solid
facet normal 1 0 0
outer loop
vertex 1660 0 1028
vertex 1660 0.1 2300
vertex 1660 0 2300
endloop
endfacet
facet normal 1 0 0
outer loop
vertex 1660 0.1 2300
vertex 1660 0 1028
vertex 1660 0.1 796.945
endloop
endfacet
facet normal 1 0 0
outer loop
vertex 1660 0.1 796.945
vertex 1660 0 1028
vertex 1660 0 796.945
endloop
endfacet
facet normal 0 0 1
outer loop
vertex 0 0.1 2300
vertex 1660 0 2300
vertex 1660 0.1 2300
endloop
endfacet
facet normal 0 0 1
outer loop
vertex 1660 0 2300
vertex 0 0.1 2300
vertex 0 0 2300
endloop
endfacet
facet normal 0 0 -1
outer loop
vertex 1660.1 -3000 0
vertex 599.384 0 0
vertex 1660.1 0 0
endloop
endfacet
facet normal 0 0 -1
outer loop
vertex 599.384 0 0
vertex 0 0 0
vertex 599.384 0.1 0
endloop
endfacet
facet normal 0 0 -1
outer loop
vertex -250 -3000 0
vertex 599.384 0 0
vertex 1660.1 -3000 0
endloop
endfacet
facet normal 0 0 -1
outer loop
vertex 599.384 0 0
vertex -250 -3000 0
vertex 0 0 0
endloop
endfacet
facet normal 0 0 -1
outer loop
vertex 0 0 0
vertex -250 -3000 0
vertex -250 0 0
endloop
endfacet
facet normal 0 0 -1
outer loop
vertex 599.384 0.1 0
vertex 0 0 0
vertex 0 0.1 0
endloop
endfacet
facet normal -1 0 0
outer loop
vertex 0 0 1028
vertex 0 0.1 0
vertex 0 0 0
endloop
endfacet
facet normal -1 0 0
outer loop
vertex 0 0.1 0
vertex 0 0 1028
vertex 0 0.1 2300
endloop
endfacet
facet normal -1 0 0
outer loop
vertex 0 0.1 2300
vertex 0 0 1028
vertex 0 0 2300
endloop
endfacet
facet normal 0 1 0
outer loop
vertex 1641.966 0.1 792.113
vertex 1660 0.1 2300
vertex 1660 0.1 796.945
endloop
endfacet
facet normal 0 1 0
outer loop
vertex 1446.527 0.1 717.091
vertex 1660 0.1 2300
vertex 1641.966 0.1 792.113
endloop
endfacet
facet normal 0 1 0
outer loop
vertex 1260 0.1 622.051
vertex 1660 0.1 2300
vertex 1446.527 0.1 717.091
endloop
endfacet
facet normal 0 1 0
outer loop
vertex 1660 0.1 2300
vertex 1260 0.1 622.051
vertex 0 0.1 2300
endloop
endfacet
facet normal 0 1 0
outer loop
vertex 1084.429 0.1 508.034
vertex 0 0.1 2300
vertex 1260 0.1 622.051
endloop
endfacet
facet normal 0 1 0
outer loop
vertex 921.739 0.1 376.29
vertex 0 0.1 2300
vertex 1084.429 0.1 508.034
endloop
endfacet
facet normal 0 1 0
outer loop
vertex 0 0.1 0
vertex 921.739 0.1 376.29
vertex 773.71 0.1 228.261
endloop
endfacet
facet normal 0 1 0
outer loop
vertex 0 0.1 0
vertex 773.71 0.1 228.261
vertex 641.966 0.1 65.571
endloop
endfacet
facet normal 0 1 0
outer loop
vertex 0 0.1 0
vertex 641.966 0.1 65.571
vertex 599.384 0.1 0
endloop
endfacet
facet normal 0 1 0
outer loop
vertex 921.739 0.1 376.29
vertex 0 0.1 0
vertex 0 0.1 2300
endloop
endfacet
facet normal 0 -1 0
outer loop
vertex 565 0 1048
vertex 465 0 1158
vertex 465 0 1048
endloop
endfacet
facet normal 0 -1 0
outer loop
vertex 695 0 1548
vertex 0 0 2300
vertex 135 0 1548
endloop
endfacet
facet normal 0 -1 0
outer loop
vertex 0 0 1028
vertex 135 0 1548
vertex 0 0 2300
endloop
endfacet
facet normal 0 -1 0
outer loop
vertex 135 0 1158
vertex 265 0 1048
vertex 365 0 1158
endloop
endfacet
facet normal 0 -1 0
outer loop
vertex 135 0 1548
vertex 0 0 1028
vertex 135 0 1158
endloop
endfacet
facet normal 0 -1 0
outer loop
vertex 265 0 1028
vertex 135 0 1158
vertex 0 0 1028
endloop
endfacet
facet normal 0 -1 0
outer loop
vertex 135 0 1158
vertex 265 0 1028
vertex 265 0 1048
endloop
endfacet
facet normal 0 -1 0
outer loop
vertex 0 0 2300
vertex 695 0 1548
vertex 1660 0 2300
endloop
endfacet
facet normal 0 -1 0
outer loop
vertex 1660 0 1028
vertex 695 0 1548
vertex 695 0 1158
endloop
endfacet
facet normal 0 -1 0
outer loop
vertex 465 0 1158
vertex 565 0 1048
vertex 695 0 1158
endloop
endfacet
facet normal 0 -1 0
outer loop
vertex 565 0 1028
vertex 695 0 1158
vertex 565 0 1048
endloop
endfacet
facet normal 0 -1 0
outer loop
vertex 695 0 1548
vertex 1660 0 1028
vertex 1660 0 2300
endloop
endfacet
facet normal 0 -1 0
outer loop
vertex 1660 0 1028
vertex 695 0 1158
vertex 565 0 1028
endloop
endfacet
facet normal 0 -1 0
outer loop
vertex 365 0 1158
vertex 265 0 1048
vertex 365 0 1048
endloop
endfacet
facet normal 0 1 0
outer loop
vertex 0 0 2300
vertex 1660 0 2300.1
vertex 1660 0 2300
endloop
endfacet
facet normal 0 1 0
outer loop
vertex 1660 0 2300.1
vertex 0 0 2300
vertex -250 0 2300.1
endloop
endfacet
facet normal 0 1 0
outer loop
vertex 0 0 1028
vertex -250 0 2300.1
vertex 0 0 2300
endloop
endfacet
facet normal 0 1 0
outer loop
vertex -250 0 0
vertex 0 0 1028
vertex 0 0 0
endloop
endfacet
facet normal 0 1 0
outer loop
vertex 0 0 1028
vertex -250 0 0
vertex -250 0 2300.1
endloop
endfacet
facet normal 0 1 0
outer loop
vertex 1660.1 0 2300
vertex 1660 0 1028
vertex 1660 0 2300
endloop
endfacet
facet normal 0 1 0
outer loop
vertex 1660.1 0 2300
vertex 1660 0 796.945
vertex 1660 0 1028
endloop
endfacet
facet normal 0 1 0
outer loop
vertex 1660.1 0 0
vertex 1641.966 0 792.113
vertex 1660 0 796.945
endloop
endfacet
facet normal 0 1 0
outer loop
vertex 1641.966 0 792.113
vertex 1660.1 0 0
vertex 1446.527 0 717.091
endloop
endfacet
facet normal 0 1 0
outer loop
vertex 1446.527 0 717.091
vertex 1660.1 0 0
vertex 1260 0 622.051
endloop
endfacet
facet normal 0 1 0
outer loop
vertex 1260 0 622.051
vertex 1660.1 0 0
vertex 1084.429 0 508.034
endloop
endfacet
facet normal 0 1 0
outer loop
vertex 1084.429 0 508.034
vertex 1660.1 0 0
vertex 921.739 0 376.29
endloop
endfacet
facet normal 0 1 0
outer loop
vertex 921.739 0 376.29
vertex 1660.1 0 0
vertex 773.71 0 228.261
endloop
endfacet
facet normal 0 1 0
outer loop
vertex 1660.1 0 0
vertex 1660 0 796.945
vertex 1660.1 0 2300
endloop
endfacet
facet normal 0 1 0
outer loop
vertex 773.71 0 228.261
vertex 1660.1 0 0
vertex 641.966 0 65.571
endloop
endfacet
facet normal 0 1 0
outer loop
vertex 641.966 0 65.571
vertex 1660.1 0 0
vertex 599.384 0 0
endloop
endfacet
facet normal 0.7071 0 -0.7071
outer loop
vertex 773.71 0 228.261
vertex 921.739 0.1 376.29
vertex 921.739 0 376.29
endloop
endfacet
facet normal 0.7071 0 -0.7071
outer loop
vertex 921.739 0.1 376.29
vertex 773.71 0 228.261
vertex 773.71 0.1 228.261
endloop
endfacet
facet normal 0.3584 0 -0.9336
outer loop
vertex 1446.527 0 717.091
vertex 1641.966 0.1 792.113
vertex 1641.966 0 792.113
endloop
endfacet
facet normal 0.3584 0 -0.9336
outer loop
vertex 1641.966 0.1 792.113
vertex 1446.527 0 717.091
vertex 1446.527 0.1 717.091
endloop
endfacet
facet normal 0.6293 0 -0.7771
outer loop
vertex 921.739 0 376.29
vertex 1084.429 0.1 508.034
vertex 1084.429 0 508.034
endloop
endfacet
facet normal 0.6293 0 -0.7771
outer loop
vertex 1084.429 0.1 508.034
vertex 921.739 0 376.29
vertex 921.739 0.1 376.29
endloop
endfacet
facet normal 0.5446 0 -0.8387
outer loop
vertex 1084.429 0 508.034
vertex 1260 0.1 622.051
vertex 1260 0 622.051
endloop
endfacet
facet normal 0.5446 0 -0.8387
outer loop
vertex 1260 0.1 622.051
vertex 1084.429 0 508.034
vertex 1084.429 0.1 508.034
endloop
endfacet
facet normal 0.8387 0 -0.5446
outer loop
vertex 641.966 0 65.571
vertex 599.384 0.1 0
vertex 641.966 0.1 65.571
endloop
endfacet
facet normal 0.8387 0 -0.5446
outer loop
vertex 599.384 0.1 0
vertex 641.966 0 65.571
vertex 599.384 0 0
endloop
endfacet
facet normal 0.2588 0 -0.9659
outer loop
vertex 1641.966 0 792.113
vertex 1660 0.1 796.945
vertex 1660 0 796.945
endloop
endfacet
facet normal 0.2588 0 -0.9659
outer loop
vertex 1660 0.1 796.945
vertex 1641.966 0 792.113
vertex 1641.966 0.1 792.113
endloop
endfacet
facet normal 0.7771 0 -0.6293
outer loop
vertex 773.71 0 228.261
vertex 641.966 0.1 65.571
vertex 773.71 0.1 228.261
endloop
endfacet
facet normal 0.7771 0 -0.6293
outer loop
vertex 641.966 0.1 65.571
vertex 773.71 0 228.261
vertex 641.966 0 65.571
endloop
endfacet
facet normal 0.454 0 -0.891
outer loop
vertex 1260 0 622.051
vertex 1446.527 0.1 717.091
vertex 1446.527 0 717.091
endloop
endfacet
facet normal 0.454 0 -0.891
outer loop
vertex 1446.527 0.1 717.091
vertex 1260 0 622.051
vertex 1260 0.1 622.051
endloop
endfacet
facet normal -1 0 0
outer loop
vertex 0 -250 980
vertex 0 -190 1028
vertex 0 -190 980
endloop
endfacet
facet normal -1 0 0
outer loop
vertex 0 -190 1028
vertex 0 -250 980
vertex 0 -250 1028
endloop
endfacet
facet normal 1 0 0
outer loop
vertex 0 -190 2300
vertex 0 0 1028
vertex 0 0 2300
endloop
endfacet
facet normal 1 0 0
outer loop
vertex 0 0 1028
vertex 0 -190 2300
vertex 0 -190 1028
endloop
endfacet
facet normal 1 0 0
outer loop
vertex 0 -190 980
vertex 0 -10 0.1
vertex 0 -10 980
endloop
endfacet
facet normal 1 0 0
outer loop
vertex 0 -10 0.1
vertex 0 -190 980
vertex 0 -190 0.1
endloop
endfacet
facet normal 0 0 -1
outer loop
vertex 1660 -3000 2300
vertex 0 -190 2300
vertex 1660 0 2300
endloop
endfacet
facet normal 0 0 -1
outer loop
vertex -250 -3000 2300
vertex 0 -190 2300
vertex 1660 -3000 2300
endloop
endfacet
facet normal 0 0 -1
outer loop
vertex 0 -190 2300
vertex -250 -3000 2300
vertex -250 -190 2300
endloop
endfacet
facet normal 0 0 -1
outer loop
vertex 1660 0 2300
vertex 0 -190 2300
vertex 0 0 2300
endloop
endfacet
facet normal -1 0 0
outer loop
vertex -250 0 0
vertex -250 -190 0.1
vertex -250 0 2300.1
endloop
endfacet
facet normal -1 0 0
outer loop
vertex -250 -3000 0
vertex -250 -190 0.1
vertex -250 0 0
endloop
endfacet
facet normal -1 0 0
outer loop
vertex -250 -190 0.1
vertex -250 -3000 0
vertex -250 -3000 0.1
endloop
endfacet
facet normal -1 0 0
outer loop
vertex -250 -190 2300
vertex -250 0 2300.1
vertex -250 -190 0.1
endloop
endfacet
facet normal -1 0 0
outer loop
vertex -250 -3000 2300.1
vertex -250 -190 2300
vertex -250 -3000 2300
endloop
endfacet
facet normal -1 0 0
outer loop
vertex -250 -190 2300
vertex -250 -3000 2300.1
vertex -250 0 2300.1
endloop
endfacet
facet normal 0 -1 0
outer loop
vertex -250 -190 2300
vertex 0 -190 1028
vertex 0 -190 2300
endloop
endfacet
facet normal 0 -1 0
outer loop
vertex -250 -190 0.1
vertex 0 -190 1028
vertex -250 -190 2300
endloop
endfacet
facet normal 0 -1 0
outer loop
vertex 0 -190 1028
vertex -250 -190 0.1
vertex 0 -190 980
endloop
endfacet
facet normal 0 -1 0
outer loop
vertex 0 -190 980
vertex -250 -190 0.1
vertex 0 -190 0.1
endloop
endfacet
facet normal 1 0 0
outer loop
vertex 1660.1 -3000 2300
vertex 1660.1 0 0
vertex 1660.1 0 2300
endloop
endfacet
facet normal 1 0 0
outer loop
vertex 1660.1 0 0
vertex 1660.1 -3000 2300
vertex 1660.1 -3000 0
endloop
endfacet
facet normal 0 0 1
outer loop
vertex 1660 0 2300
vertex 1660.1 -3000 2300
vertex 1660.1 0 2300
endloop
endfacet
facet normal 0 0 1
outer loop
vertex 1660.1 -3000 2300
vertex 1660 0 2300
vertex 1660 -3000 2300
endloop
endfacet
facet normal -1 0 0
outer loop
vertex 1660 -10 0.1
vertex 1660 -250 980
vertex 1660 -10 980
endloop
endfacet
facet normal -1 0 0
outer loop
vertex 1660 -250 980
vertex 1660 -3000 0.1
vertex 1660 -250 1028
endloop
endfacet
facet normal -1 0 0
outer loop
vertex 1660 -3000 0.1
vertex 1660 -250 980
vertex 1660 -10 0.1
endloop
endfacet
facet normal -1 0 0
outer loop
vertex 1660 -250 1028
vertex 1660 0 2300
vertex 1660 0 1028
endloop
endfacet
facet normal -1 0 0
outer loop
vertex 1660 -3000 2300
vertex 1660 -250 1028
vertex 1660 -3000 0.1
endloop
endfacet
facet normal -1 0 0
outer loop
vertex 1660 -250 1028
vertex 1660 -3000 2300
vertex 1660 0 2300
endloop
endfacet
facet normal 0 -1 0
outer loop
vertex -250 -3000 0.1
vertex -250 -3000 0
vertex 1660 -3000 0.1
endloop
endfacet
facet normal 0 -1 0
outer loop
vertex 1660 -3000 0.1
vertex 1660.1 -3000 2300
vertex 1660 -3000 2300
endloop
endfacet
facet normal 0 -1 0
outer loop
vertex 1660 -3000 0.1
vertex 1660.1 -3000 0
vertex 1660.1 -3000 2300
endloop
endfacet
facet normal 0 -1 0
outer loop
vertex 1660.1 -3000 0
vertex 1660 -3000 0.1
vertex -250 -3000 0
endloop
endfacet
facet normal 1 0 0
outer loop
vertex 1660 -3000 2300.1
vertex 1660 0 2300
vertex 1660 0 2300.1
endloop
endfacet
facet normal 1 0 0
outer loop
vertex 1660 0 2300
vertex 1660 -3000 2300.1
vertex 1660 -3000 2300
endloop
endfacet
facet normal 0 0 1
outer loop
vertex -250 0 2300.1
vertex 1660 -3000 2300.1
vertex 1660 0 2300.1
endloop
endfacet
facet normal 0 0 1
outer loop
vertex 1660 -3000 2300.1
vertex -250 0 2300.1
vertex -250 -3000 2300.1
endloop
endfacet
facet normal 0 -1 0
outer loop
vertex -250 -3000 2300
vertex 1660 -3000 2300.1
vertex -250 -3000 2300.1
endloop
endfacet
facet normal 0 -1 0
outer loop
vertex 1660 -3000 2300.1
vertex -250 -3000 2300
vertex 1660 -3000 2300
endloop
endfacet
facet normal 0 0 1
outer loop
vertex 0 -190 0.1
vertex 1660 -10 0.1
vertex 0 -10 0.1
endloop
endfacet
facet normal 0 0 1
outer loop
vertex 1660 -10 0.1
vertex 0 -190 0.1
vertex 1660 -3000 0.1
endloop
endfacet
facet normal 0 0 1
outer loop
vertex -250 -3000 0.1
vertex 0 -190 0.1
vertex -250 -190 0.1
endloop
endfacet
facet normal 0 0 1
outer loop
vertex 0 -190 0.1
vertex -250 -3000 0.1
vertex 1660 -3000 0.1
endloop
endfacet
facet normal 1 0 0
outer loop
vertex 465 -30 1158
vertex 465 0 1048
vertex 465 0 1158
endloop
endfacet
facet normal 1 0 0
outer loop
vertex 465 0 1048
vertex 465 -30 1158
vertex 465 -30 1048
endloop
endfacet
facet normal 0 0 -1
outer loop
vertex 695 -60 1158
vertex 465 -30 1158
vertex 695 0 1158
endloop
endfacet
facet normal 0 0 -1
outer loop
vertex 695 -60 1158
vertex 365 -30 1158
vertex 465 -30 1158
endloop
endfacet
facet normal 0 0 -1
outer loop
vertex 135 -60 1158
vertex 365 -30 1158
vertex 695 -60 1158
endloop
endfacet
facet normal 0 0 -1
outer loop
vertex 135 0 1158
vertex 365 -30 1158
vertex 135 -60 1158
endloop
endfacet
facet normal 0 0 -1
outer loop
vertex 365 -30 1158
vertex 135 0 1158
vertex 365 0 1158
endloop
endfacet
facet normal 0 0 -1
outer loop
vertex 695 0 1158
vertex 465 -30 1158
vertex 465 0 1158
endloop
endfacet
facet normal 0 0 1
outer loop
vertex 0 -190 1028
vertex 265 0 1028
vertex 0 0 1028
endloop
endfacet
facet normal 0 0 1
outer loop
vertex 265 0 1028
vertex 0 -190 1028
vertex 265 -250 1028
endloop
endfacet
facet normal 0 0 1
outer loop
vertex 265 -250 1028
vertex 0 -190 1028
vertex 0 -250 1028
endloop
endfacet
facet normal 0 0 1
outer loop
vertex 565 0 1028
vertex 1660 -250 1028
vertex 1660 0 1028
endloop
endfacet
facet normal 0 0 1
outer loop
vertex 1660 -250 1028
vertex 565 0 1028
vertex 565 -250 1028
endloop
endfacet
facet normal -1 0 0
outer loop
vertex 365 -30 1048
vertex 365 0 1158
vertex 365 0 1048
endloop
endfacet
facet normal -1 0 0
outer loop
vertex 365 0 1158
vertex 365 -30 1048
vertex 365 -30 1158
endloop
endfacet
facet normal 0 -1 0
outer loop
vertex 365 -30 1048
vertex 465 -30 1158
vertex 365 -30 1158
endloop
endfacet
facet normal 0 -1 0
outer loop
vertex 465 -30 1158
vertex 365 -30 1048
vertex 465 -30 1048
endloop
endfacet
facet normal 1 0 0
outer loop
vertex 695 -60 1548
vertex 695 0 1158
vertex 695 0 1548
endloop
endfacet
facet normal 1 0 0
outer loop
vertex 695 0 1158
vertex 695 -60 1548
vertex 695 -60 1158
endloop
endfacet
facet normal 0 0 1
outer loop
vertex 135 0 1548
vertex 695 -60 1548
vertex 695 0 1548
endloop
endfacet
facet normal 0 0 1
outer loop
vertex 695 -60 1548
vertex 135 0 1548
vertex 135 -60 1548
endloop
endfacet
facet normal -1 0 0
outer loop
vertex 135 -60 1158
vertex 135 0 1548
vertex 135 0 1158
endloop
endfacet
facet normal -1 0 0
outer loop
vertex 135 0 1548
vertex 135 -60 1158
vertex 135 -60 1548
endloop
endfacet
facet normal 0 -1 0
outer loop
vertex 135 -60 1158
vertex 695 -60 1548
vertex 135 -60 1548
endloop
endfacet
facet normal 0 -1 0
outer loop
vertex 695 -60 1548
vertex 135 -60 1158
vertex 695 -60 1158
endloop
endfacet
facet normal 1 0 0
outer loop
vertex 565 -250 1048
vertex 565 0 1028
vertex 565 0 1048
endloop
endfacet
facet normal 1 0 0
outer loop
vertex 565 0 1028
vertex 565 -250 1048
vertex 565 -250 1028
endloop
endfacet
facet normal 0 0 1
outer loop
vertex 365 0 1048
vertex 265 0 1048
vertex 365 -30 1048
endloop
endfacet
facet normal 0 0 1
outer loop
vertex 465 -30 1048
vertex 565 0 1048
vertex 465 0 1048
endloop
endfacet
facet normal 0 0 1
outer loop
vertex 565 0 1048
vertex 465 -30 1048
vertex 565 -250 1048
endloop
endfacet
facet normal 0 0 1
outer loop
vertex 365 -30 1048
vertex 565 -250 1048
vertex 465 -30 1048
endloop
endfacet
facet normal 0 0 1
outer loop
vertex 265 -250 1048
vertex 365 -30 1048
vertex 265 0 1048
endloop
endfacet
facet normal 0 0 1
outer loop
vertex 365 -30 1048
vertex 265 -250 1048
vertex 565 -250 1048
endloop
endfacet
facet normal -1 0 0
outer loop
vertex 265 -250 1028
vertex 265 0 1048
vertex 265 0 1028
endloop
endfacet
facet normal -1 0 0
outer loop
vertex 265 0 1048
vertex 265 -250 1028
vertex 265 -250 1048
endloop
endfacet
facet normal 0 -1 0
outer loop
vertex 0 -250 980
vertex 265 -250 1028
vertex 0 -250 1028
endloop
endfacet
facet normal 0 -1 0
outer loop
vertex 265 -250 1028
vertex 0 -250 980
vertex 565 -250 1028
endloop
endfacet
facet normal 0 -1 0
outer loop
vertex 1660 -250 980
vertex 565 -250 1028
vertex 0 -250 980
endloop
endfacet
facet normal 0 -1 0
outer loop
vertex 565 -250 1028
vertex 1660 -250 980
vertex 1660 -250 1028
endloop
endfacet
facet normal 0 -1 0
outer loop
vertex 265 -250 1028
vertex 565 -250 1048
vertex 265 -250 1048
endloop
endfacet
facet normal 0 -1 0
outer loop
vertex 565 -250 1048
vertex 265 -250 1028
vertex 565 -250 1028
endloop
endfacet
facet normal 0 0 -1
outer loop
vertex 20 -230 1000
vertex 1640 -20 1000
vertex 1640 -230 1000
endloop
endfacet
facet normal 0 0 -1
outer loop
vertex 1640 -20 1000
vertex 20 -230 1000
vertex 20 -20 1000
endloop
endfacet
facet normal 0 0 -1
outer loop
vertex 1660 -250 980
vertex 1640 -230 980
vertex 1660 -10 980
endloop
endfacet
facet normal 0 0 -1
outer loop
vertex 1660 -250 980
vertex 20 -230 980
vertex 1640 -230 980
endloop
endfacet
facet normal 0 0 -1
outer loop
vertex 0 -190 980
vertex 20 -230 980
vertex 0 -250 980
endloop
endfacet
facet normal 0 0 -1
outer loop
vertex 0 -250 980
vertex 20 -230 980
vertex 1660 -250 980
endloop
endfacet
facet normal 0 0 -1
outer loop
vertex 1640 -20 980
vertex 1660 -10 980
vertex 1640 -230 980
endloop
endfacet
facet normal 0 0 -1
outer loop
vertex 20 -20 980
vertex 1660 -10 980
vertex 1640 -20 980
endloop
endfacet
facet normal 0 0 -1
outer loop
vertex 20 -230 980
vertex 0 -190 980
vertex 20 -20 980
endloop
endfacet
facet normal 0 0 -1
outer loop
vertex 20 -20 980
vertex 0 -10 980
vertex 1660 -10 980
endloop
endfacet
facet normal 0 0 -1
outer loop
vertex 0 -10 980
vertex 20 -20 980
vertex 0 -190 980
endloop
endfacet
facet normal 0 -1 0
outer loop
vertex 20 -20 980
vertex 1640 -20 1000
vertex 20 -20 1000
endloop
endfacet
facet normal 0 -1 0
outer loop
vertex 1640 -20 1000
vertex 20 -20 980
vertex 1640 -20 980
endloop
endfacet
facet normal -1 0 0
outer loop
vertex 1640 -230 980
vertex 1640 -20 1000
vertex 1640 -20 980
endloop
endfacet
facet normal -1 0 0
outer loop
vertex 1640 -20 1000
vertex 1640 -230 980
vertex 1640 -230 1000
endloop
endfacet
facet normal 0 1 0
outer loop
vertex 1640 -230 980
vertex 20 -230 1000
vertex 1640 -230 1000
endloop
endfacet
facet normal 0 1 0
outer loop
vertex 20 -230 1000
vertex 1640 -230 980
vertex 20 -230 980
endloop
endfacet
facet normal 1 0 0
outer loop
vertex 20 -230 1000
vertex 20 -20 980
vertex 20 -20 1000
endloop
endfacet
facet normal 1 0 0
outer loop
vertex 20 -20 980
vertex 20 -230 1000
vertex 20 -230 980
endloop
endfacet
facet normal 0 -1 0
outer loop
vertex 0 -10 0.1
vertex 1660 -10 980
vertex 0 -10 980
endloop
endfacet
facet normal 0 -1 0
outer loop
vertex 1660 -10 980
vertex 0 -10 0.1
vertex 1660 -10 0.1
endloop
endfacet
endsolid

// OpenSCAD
/*
 * Shelf in fitness basement
 */

/*
Shelf        : 1660(TBC) x 250 x 28
Back plate   : 1660(TBC) x 980 x 10

Supports     : 2x : 1910 x 20 x 20
Steel tube

Wood screws      : 5 pc @ 28cm
Concrete screws  : 4 pc
Wood screws thin : 5 pc
Wood screws thin : 6 pc
*/


ROOM_HEIGHT  = 2300;
WALL_WIDTH   = 1660;
PILLAR_DEPTH =  190;
PILLAR_WIDTH =  250;
DEPTH        = 3000;

module pillar() {
    translate([-PILLAR_WIDTH, -PILLAR_DEPTH, 0])
    cube([PILLAR_WIDTH, PILLAR_DEPTH, ROOM_HEIGHT]);
}

module back_wall() {
    difference() {
        cube([WALL_WIDTH, .1, ROOM_HEIGHT]);

        r = 2000;
        translate([WALL_WIDTH+r -1400, 0, -r+90 + 800])
        rotate([90, 0, 0]) 
        cylinder(r=r, h=30, center=true, $fn=60);
    }
}

module side_wall() {
    translate([WALL_WIDTH, -DEPTH, 0])
    cube([.1, DEPTH, ROOM_HEIGHT]);
}

module ceiling() {
    translate([-PILLAR_WIDTH, -DEPTH, ROOM_HEIGHT])
    cube([PILLAR_WIDTH+WALL_WIDTH, DEPTH, .1]);
}

module floor() {
    translate([-PILLAR_WIDTH, -DEPTH, 0])
    cube([PILLAR_WIDTH+WALL_WIDTH, DEPTH, .1]);
}

module room() {
    color("#ddd") {
        pillar();
        back_wall();
        side_wall();
        ceiling();
    }
    color("#444")
    floor();
}

module computer() {
    translate([-560/2, -60, 0])
    color("black") {
        translate([560/2-100/2, 60-30, 0]) cube([100, 30, 130]);
        translate([0, 0, 130]) cube([560, 60, 390]);
        translate([560/2-300/2, -250 +60, 0])
        cube([300, 250, 20]);
    }
}


SHELF_LENGTH     = 1660;
SHELF_WIDTH      =  250;
SHELF_THICKNESS  =   28;
SHELF_ALTITUDE   = 1000;

SHELF_THICKNESS2 =   18;
SHELF_WIDTH2     =  150;

SHELF_BACK_THICKNESS = 10;
SHELF_SUPPORT_THICKNESS = 20;

module shelf_top() {
    echo(str("Shelf: ", SHELF_LENGTH, "(TBC) x ", SHELF_WIDTH, " x ", SHELF_THICKNESS));

    color("orange")
    cube([SHELF_LENGTH, SHELF_WIDTH, SHELF_THICKNESS]);
}

module shelf_base() {
    color("orange")
    cube([SHELF_LENGTH, SHELF_WIDTH2, SHELF_THICKNESS2]);
}

module shelf_center() {
    color("orange")
    cube([SHELF_THICKNESS2,
          SHELF_WIDTH2,
          SHELF_ALTITUDE-SHELF_THICKNESS2]);
}

BACK_COLOR = "white";

module shelf_back_narrow() {
    width  = WALL_WIDTH/2;
    height = SHELF_ALTITUDE;
    thickness = SHELF_BACK_THICKNESS;
    echo(str("Back plate: ", width, " x ", height, " x ", thickness));
    color(BACK_COLOR)
    cube([width-2, thickness, height]);
}

module shelf_back() {
    width  = WALL_WIDTH;
    height = SHELF_ALTITUDE - SHELF_SUPPORT_THICKNESS;
    thickness = SHELF_BACK_THICKNESS;
    echo(str("Back plate: ", width, "(TBC) x ", height, " x ", thickness));

    color(BACK_COLOR)
    cube([width, thickness, height]);
}

module shelf_supports() {
    echo(str("Supports: 2x : ", WALL_WIDTH+SHELF_WIDTH, " x ",
                                SHELF_SUPPORT_THICKNESS, " x ", SHELF_SUPPORT_THICKNESS));
    echo(    "Steel tube");
    echo(str("Wood screws      : 5 pc @ ", ceil(WALL_WIDTH/(6)/10), "cm"));
    echo(    "Concrete screws  : 4 pc");
    echo(    "Wood screws thin : 5 pc");
    echo(str("Wood screws thin : 6 pc"));
    
    color("orange") {
        cube([WALL_WIDTH, SHELF_SUPPORT_THICKNESS, SHELF_SUPPORT_THICKNESS]);

        translate([WALL_WIDTH-SHELF_SUPPORT_THICKNESS, -SHELF_WIDTH + SHELF_SUPPORT_THICKNESS, 0])
        cube([SHELF_SUPPORT_THICKNESS, SHELF_WIDTH, SHELF_SUPPORT_THICKNESS]);

        translate([0, -SHELF_WIDTH + SHELF_SUPPORT_THICKNESS, 0])
        cube([WALL_WIDTH, SHELF_SUPPORT_THICKNESS, SHELF_SUPPORT_THICKNESS]);

        translate([0, -SHELF_WIDTH + SHELF_SUPPORT_THICKNESS, 0])
        cube([SHELF_SUPPORT_THICKNESS, SHELF_WIDTH, SHELF_SUPPORT_THICKNESS]);

    }
}
////////////////////////////////////////////////////////////////////////////////

room();

translate([WALL_WIDTH*.25, 0, SHELF_ALTITUDE + SHELF_THICKNESS]) computer();

translate([0, -SHELF_WIDTH, SHELF_ALTITUDE]) shelf_top();

if (0) {
    translate([0, -SHELF_BACK_THICKNESS, 0]) shelf_back_narrow();
    translate([WALL_WIDTH/2+1, -SHELF_BACK_THICKNESS, 0]) shelf_back_narrow();
} else {
    translate([0, -SHELF_BACK_THICKNESS, 0]) shelf_back();
}

translate([0, -SHELF_SUPPORT_THICKNESS, SHELF_ALTITUDE-SHELF_SUPPORT_THICKNESS])
shelf_supports();
